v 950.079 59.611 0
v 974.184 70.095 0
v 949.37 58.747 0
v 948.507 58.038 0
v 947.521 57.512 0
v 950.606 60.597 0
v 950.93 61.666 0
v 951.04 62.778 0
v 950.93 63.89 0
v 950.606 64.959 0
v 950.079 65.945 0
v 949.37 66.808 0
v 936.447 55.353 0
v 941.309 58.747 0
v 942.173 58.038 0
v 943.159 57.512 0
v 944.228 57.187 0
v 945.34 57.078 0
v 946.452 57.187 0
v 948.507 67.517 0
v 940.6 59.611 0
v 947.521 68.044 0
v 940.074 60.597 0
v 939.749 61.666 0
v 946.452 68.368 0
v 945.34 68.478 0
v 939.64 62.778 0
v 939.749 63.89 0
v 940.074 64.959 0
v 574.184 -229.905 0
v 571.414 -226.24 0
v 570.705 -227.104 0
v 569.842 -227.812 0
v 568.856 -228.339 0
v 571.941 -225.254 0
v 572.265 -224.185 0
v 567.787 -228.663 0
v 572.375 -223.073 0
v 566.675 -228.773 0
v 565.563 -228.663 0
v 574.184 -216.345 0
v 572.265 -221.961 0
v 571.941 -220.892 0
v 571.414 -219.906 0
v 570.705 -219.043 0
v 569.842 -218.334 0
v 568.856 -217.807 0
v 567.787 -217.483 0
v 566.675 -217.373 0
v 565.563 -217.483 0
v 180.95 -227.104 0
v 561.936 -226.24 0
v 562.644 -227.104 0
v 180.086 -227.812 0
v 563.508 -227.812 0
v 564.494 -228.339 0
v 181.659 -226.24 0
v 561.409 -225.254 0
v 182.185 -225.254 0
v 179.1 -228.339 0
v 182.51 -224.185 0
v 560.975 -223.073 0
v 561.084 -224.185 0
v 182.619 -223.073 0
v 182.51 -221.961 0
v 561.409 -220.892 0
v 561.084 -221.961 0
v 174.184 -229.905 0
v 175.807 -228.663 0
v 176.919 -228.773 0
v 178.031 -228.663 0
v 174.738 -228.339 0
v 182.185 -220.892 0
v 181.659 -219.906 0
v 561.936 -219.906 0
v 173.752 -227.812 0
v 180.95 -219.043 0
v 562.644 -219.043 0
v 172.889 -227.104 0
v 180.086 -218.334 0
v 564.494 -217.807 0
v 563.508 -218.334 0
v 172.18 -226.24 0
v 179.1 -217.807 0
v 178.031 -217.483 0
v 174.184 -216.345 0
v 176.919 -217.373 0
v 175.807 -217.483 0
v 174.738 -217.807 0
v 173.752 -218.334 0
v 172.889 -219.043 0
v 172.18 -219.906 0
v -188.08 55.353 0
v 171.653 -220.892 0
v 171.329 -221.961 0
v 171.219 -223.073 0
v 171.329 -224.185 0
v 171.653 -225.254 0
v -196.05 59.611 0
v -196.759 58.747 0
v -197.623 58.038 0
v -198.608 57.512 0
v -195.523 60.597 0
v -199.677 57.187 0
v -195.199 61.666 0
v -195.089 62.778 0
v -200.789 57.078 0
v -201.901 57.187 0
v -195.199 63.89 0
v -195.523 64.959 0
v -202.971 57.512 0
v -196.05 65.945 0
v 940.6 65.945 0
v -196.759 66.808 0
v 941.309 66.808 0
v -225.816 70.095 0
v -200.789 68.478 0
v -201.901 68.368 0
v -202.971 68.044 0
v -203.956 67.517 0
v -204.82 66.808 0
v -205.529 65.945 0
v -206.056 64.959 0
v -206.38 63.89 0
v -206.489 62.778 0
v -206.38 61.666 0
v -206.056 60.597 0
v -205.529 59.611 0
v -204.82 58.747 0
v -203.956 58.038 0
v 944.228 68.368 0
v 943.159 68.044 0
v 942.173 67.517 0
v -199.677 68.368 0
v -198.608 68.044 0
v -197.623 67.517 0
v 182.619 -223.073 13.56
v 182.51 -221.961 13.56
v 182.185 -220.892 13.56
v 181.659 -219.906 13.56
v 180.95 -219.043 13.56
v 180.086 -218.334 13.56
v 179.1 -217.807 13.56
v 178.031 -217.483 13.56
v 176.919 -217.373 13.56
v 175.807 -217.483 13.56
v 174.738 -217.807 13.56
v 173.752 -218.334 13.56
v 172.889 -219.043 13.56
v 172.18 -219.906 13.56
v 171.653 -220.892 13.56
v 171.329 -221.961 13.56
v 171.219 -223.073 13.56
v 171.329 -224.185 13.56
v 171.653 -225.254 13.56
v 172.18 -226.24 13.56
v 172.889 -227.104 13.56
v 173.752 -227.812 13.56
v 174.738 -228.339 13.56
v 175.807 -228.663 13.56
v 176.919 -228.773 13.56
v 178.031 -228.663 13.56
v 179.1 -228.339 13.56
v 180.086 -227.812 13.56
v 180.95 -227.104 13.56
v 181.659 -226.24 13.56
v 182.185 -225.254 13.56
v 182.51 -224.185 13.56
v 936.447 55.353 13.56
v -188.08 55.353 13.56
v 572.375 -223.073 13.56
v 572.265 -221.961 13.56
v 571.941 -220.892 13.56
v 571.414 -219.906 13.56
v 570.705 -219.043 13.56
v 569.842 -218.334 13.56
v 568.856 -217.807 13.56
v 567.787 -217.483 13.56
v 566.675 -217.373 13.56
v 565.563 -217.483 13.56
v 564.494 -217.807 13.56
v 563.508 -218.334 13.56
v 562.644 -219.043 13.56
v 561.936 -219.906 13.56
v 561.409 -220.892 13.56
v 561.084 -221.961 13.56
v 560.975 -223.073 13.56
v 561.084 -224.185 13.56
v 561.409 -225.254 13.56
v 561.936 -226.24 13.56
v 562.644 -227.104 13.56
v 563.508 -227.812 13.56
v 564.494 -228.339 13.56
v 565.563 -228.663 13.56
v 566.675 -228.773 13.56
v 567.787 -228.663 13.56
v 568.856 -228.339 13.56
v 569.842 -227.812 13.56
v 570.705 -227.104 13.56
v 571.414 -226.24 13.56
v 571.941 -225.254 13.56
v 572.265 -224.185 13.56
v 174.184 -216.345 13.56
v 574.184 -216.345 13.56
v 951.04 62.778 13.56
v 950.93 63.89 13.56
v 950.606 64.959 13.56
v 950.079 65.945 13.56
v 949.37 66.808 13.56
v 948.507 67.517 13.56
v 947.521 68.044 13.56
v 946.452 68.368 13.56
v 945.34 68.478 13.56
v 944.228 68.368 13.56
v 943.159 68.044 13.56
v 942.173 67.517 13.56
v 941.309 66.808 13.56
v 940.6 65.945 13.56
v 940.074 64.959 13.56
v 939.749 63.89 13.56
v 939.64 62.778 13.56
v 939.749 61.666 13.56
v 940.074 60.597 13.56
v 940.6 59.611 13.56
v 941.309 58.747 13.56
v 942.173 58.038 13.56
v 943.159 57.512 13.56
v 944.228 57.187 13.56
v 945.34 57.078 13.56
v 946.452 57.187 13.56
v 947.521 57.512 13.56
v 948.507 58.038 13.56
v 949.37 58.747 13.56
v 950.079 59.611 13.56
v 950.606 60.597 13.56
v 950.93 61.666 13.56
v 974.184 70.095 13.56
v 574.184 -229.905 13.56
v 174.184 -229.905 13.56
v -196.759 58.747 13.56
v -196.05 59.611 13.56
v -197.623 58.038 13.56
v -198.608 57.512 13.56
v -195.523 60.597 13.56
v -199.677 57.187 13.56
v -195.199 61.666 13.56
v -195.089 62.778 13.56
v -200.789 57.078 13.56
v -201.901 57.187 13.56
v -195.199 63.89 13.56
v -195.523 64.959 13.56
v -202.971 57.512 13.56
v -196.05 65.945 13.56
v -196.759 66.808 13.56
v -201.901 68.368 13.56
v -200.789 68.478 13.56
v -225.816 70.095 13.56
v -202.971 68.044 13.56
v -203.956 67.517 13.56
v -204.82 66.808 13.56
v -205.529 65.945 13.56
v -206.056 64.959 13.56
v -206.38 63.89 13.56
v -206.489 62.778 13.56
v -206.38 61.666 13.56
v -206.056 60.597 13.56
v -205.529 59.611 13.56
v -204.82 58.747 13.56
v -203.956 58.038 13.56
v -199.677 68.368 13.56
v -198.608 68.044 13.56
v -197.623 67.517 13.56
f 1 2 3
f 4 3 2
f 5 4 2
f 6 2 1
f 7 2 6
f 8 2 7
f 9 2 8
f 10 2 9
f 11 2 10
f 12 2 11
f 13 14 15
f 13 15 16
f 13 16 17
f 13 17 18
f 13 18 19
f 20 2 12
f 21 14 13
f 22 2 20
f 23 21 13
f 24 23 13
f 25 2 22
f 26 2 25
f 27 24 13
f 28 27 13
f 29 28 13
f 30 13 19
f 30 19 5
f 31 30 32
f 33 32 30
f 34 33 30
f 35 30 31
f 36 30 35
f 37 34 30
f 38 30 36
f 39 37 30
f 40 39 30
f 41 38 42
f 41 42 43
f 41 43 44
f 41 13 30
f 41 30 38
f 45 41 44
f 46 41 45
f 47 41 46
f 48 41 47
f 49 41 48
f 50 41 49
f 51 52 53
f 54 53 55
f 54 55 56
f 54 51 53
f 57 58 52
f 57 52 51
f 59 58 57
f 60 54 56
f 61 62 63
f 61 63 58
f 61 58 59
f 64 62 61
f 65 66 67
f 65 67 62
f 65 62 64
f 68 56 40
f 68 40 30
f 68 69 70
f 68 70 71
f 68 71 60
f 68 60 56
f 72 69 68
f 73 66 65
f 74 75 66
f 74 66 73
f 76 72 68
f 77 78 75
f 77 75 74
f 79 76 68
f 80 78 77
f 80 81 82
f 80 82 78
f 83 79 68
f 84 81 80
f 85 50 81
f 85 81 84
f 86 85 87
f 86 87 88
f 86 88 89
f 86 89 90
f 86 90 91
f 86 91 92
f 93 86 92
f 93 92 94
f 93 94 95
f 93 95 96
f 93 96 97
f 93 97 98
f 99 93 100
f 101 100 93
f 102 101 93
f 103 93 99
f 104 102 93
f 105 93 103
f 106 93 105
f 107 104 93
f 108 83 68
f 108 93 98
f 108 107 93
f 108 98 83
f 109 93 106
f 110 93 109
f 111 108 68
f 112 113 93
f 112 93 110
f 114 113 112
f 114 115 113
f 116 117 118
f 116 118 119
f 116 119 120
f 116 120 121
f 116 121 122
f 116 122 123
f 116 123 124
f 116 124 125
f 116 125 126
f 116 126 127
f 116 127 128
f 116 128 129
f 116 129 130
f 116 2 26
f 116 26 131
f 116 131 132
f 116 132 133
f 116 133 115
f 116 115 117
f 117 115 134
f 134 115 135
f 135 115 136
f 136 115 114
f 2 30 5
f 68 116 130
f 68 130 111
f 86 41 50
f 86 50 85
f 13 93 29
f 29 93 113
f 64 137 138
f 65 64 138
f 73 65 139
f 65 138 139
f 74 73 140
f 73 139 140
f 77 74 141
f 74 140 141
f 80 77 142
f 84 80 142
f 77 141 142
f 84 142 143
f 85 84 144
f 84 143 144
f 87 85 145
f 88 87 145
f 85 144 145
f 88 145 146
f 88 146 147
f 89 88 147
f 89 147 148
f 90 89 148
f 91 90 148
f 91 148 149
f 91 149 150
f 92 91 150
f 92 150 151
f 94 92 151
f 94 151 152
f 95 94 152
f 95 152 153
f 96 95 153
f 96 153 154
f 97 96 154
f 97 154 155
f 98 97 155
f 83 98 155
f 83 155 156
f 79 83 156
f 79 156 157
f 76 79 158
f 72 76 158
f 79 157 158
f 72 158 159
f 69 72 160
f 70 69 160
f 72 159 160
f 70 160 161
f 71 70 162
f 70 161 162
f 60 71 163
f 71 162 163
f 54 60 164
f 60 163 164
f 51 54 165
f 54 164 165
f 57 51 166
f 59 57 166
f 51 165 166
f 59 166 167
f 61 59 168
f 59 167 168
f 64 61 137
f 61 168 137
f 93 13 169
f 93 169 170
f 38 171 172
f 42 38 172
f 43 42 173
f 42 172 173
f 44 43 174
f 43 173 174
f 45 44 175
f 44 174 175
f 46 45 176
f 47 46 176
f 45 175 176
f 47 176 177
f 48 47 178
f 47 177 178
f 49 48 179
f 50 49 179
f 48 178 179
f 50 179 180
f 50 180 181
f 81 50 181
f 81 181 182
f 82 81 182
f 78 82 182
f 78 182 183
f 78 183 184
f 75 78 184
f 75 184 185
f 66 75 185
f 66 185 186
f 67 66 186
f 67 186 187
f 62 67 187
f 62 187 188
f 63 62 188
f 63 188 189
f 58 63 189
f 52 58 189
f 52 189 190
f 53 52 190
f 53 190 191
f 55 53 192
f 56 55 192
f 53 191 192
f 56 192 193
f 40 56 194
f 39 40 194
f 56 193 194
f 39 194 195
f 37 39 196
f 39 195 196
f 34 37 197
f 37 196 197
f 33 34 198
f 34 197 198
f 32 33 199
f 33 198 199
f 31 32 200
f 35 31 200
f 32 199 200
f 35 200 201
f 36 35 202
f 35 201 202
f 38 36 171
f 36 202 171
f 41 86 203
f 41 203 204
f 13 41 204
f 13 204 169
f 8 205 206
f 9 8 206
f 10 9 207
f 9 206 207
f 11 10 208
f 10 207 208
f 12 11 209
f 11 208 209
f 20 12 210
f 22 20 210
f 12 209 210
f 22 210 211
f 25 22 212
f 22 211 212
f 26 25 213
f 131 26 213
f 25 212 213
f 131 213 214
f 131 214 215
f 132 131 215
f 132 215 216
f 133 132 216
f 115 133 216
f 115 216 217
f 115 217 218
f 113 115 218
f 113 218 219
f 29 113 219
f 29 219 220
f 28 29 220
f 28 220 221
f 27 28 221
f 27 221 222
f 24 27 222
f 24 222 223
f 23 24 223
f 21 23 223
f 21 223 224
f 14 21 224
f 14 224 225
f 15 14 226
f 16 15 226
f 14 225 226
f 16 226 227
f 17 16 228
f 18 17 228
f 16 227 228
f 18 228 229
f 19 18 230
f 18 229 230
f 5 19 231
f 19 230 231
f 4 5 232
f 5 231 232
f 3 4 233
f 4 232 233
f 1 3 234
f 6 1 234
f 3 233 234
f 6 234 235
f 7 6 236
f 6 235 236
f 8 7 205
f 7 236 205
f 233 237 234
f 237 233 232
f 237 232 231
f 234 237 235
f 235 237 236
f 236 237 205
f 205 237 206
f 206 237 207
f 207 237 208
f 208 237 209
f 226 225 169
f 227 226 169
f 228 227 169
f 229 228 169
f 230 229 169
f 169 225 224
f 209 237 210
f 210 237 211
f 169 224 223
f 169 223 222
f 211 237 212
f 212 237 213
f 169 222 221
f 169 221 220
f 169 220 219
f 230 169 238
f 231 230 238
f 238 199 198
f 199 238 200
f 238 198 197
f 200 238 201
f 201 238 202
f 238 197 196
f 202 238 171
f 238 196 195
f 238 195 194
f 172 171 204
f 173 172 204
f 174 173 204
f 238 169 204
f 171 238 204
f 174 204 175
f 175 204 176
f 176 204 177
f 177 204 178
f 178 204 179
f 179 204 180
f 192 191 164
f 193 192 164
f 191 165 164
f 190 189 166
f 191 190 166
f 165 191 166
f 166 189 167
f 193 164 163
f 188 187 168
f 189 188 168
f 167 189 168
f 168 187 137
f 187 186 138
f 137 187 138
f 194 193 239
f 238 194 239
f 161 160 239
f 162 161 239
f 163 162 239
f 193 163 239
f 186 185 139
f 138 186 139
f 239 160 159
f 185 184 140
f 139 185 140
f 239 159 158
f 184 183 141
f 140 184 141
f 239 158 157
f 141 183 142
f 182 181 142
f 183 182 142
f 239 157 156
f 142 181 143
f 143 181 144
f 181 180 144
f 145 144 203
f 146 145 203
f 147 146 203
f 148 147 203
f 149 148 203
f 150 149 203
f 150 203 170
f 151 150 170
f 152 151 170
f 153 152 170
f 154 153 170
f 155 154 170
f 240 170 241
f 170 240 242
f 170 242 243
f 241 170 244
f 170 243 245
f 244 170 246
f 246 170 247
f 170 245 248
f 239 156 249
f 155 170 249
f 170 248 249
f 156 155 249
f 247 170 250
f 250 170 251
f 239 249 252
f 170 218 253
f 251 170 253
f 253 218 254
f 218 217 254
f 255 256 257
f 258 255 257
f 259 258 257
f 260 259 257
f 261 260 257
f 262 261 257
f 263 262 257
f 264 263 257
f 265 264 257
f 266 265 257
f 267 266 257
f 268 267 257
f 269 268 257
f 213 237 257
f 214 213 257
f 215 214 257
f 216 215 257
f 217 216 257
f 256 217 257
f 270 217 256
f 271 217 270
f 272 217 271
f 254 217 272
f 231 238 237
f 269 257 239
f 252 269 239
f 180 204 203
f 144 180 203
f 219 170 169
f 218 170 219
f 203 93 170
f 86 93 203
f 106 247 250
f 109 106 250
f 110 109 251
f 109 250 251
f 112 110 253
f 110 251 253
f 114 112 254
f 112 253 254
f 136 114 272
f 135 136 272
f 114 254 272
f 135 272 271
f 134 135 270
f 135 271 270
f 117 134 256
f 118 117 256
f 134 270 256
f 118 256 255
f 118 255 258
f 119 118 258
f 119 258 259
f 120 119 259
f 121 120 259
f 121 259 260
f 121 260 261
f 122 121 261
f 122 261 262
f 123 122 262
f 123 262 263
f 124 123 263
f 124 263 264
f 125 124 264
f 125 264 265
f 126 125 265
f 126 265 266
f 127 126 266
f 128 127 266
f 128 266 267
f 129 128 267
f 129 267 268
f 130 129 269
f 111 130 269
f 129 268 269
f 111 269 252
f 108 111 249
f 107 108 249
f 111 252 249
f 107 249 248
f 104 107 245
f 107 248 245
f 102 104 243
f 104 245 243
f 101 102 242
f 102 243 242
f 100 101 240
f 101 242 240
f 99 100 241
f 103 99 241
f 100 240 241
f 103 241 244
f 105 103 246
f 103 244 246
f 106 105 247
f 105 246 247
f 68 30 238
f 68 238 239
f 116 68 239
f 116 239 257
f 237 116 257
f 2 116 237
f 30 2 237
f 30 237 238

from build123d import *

# Parameters (mm, degrees)
BOSS_EXTRUDE2_DEPTH = 13.56
SKETCH5_R           = 5.7
CUT_EXTRUDE1_DEPTH  = 1002.036692109


with BuildPart() as part:
    # Sketch4 → Boss-Extrude2 (new body)
    with BuildSketch(Plane.XY):
        Polygon((-225.81606276, 70.095146264), (974.18393724, 70.095146264), (574.18393724, -229.904853736), (174.18393724, -229.904853736), align=None)
        Polygon((574.18393724, -216.344853736), (936.447387254, 55.352733774), (-188.079512773, 55.352733774), (174.18393724, -216.344853736), align=None, mode=Mode.SUBTRACT)
    extrude(amount=BOSS_EXTRUDE2_DEPTH)

    # Sketch5 → Cut-Extrude1 (cut, through all)
    with BuildSketch(Plane.XY.offset(13.56)):
        with Locations((945.339868666, 62.77782)):
            Circle(SKETCH5_R)
        with Locations((-200.789433704, 62.77782)):
            Circle(SKETCH5_R)
        with Locations((176.91916089, -223.073008716)):
            Circle(SKETCH5_R)
        with Locations((566.674885297, -223.073008716)):
            Circle(SKETCH5_R)
    extrude(amount=-CUT_EXTRUDE1_DEPTH, mode=Mode.SUBTRACT)


solid = part.part
